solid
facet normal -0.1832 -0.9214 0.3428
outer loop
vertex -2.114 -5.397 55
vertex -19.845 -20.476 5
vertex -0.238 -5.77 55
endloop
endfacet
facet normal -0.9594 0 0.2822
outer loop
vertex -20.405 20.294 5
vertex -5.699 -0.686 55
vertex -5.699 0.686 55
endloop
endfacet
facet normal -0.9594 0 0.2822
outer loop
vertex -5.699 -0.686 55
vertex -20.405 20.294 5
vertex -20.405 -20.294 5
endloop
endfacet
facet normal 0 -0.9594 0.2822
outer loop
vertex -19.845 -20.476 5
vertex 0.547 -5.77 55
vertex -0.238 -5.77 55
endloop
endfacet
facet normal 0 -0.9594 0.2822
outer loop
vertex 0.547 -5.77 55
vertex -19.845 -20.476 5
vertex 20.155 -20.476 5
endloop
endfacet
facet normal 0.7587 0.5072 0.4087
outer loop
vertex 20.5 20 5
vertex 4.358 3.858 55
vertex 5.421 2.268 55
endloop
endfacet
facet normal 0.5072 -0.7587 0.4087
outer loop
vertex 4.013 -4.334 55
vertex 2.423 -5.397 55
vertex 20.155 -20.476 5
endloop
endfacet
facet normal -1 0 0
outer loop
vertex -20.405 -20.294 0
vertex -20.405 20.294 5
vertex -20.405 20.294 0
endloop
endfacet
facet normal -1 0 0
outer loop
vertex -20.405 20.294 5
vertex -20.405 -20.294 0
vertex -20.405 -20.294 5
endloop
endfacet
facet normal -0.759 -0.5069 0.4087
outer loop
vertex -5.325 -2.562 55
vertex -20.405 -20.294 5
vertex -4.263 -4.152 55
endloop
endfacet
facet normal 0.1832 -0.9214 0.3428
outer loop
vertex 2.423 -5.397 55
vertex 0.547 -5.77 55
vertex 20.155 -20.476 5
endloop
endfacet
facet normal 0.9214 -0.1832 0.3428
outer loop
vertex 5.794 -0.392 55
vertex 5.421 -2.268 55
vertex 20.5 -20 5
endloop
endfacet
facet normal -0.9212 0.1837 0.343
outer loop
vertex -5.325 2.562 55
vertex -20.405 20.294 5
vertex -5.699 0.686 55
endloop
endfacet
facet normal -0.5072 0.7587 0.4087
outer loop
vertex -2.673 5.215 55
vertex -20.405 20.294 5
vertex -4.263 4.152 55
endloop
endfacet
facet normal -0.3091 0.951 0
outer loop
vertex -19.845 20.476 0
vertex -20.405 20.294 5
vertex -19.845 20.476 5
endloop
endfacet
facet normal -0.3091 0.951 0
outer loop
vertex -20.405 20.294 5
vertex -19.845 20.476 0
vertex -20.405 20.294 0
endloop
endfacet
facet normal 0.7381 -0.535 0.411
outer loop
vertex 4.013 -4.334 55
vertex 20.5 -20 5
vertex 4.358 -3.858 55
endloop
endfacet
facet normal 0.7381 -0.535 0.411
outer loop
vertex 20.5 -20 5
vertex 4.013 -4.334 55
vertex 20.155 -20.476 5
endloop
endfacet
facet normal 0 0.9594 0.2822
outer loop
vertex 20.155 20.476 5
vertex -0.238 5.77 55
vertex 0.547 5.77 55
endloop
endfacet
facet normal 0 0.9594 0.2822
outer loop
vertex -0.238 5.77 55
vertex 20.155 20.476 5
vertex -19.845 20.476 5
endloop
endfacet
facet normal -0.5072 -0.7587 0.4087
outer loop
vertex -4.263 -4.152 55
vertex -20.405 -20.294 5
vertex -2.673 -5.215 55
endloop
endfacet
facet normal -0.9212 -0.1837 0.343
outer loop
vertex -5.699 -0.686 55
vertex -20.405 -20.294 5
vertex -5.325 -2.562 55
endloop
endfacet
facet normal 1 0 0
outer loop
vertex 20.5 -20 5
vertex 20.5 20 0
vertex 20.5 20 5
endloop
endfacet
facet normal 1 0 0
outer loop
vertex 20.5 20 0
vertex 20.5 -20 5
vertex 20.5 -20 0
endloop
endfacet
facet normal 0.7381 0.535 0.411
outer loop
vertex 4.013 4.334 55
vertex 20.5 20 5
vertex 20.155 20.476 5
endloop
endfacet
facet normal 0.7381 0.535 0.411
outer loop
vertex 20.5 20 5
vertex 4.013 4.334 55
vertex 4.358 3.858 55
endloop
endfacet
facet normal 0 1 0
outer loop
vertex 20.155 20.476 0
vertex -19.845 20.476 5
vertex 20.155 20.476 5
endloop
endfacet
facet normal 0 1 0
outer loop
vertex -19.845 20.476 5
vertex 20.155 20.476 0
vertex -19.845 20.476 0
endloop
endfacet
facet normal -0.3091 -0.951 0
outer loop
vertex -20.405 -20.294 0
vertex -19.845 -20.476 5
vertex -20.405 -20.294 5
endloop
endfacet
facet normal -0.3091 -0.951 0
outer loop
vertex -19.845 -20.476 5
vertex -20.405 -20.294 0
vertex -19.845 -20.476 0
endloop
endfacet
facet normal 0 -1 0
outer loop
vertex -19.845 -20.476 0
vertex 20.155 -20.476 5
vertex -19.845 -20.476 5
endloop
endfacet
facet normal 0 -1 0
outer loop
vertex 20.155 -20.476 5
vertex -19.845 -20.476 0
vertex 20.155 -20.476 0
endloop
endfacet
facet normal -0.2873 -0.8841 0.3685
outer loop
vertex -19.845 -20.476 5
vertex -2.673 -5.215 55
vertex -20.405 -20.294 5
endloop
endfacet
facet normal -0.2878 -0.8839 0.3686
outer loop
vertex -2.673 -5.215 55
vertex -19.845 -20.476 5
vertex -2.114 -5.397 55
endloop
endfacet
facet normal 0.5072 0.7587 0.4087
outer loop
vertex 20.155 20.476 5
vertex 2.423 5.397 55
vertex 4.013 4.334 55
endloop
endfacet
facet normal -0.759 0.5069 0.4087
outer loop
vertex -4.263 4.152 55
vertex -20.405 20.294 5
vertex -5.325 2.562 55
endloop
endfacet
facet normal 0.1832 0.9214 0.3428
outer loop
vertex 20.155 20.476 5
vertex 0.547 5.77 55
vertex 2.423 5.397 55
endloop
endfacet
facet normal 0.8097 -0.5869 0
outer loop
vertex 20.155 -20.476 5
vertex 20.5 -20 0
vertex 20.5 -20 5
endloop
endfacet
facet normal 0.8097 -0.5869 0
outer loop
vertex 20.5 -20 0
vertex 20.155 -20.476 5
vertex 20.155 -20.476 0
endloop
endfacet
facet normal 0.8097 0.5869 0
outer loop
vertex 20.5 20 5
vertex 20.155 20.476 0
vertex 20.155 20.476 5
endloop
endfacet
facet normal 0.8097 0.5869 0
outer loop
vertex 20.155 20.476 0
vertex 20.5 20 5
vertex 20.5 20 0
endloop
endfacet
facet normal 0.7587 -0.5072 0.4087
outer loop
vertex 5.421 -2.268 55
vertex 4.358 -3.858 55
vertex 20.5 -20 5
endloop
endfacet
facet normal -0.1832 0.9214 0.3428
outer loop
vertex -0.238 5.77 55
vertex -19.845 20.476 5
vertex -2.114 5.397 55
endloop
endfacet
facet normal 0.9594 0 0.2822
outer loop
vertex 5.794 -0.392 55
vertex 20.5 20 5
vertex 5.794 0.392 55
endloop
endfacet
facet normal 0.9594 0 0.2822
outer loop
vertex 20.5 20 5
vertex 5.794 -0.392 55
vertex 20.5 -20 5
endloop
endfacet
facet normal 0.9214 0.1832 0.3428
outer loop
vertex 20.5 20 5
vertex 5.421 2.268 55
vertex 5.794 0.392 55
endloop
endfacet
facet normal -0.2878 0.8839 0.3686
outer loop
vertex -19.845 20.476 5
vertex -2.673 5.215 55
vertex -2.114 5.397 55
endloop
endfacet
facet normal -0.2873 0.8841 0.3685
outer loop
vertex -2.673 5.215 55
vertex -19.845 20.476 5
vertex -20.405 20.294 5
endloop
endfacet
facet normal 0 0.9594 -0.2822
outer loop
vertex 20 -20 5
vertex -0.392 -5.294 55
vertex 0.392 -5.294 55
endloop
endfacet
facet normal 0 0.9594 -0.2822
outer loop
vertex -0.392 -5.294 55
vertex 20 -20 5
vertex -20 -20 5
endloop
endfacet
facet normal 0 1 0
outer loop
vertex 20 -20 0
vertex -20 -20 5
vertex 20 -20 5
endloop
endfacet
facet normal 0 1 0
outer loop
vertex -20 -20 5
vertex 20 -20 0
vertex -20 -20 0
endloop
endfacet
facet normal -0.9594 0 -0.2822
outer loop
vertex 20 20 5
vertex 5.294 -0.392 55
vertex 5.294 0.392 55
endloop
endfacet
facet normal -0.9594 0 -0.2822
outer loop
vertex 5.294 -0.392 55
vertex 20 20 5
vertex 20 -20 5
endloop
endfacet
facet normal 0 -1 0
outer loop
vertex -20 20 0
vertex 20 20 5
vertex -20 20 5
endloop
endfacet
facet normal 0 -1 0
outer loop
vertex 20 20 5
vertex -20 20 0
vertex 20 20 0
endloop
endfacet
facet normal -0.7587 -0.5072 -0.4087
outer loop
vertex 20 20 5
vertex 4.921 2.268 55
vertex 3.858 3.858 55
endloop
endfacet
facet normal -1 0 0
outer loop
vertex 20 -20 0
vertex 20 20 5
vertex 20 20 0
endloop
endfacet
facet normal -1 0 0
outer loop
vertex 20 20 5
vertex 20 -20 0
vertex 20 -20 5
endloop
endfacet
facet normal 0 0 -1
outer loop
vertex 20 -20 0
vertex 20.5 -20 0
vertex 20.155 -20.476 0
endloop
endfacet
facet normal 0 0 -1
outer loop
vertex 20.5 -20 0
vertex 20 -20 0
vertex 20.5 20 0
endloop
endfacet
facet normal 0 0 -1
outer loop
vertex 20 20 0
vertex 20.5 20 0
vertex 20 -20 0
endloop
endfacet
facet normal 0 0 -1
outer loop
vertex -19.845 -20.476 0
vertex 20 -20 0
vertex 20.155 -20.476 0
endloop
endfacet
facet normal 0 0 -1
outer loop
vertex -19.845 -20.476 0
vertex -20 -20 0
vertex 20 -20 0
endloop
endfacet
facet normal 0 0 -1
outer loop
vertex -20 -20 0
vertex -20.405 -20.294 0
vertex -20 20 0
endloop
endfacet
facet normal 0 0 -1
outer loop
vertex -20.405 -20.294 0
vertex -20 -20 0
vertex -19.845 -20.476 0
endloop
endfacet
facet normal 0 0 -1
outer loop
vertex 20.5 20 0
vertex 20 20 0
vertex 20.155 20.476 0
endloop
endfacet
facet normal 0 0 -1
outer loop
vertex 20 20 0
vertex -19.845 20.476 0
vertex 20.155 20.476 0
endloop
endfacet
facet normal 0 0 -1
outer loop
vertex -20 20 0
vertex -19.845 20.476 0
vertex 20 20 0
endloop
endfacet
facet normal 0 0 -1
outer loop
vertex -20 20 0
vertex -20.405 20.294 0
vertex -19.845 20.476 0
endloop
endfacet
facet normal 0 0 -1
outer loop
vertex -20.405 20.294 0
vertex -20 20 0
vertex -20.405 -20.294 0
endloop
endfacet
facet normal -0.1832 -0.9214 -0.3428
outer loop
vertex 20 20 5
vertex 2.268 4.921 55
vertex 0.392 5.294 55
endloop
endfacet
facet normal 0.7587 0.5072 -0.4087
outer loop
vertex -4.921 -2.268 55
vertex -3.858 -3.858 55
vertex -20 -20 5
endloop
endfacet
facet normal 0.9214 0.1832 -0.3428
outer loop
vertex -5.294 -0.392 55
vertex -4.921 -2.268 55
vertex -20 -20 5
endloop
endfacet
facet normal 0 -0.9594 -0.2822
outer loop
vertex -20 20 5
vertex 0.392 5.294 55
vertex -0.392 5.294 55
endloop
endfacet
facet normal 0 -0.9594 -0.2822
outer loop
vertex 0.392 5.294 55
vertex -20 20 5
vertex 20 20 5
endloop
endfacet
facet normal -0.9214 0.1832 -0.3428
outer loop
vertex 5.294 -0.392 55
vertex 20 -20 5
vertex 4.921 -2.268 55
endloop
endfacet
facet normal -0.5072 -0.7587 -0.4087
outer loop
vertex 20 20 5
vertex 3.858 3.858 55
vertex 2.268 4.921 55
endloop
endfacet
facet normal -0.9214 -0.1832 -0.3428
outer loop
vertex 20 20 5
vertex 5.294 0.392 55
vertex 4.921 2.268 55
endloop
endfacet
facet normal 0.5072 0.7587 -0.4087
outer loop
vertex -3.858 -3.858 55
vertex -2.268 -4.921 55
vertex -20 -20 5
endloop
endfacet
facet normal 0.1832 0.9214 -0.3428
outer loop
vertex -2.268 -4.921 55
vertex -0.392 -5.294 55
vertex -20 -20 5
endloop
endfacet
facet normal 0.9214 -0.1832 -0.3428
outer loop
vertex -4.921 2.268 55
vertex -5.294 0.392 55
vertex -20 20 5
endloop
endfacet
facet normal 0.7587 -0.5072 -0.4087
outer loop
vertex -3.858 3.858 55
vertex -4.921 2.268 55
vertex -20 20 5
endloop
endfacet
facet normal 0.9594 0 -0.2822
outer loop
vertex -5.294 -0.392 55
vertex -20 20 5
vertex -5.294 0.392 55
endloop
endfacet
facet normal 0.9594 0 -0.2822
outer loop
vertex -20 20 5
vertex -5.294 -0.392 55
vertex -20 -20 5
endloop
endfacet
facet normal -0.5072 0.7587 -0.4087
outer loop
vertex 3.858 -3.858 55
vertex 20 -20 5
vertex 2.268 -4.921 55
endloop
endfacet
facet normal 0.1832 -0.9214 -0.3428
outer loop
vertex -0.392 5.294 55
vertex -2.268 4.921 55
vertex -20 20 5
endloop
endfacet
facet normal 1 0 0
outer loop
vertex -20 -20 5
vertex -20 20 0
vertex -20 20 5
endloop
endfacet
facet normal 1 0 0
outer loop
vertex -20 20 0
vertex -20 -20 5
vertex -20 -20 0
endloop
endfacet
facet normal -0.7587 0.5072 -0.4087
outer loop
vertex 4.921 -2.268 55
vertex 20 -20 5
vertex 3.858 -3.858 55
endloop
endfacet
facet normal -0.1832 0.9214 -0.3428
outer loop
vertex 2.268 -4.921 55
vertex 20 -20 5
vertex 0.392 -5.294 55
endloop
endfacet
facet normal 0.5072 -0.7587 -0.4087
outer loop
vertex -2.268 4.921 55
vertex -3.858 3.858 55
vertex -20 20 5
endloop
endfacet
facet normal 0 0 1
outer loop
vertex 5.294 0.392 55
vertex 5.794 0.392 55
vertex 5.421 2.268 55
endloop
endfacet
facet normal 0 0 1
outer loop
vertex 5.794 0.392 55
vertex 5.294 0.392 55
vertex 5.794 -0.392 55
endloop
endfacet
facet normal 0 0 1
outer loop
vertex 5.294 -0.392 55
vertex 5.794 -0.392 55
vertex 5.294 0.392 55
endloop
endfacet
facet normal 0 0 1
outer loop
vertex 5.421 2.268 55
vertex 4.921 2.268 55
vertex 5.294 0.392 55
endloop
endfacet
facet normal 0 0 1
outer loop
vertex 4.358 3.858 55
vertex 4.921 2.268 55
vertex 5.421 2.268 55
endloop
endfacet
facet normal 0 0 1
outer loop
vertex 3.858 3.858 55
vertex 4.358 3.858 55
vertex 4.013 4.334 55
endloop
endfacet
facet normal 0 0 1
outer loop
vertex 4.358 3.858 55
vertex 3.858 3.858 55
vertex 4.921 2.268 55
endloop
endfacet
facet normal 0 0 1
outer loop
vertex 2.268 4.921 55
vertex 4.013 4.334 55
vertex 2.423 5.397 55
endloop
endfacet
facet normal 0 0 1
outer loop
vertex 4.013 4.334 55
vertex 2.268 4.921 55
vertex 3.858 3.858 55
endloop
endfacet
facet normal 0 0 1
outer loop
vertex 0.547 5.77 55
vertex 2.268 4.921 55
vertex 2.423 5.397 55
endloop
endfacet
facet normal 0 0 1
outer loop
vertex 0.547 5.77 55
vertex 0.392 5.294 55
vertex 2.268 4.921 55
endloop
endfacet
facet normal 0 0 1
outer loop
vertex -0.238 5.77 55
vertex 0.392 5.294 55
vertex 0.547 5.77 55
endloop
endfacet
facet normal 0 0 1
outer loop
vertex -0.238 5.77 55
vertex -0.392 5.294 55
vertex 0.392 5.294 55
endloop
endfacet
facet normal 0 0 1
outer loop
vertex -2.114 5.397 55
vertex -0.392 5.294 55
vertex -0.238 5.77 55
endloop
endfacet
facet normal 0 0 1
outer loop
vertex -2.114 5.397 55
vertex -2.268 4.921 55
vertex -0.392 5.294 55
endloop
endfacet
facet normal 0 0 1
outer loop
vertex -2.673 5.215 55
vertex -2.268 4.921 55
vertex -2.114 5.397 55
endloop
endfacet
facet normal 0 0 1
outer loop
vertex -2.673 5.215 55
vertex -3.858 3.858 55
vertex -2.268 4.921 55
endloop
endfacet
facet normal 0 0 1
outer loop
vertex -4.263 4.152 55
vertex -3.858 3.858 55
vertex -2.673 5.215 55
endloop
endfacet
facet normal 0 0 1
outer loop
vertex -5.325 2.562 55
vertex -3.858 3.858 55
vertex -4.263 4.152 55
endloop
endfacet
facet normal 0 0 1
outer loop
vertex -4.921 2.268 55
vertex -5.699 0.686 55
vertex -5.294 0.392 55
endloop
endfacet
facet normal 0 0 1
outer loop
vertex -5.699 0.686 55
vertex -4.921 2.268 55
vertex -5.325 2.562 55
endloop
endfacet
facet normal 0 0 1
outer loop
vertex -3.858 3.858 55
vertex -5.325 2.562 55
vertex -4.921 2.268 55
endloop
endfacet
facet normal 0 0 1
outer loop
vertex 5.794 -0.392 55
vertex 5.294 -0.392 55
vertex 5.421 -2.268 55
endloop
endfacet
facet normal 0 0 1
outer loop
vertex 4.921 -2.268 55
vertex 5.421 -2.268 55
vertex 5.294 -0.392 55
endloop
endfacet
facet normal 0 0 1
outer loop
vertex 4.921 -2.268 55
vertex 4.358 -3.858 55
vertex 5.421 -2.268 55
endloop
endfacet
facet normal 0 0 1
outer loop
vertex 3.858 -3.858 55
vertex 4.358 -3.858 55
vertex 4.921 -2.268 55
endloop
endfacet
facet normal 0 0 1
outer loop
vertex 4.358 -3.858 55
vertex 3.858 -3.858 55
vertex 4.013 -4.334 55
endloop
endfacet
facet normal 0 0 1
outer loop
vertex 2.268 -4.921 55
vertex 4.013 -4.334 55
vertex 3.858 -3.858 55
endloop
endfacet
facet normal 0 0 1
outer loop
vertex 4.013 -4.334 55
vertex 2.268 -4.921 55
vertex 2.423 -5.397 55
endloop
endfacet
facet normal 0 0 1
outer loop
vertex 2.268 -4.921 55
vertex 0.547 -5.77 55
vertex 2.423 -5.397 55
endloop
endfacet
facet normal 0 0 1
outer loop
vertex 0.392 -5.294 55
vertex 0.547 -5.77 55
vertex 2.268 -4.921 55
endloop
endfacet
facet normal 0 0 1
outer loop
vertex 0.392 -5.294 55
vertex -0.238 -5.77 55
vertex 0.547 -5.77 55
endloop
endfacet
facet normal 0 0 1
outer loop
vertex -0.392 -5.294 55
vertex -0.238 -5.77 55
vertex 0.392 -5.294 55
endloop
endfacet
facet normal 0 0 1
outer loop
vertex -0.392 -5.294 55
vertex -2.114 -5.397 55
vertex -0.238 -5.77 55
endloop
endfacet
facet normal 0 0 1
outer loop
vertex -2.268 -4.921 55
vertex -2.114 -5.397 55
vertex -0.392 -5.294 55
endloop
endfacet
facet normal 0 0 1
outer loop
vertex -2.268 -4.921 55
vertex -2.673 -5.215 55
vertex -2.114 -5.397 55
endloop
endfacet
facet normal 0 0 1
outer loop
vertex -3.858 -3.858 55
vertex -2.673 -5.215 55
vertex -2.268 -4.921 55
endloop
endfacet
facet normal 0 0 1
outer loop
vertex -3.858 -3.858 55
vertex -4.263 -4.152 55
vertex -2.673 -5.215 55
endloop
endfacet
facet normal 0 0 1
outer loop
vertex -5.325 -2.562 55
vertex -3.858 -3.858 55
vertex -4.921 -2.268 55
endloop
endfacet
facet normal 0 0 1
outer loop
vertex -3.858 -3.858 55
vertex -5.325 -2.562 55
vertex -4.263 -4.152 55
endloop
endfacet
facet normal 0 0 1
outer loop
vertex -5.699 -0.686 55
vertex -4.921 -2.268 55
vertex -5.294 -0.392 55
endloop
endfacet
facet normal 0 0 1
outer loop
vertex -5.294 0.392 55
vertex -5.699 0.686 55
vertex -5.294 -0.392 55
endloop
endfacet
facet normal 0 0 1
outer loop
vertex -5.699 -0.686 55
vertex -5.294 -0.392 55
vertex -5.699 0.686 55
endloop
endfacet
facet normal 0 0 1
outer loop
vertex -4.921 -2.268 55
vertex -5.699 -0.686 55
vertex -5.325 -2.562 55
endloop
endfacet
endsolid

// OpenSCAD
// Fan duct!
wt = 0.5;
fan_xy = 40;
fan_z = 5;
duct_z = 50;
outlet_r = 5;
scale_val = (fan_xy+2*wt)/fan_xy;
 
module duct_inside() {
    translate([0,0,fan_z/2]) hull() {
        cube([fan_xy,fan_xy,fan_z],center=true);
        translate([0,0,duct_z+fan_z/2]) cylinder(r=outlet_r,h=1);
    }  
}
 
module duct() {
    difference() {
        minkowski () {
            duct_inside();
            sphere(r=wt);
        }
        duct_inside();
        translate([0,0,-5]) cube([100,100,10],center=true);
        translate([0,0,5+fan_z+duct_z]) cube([100,100,10],center=true);
    }
}
render() duct();
